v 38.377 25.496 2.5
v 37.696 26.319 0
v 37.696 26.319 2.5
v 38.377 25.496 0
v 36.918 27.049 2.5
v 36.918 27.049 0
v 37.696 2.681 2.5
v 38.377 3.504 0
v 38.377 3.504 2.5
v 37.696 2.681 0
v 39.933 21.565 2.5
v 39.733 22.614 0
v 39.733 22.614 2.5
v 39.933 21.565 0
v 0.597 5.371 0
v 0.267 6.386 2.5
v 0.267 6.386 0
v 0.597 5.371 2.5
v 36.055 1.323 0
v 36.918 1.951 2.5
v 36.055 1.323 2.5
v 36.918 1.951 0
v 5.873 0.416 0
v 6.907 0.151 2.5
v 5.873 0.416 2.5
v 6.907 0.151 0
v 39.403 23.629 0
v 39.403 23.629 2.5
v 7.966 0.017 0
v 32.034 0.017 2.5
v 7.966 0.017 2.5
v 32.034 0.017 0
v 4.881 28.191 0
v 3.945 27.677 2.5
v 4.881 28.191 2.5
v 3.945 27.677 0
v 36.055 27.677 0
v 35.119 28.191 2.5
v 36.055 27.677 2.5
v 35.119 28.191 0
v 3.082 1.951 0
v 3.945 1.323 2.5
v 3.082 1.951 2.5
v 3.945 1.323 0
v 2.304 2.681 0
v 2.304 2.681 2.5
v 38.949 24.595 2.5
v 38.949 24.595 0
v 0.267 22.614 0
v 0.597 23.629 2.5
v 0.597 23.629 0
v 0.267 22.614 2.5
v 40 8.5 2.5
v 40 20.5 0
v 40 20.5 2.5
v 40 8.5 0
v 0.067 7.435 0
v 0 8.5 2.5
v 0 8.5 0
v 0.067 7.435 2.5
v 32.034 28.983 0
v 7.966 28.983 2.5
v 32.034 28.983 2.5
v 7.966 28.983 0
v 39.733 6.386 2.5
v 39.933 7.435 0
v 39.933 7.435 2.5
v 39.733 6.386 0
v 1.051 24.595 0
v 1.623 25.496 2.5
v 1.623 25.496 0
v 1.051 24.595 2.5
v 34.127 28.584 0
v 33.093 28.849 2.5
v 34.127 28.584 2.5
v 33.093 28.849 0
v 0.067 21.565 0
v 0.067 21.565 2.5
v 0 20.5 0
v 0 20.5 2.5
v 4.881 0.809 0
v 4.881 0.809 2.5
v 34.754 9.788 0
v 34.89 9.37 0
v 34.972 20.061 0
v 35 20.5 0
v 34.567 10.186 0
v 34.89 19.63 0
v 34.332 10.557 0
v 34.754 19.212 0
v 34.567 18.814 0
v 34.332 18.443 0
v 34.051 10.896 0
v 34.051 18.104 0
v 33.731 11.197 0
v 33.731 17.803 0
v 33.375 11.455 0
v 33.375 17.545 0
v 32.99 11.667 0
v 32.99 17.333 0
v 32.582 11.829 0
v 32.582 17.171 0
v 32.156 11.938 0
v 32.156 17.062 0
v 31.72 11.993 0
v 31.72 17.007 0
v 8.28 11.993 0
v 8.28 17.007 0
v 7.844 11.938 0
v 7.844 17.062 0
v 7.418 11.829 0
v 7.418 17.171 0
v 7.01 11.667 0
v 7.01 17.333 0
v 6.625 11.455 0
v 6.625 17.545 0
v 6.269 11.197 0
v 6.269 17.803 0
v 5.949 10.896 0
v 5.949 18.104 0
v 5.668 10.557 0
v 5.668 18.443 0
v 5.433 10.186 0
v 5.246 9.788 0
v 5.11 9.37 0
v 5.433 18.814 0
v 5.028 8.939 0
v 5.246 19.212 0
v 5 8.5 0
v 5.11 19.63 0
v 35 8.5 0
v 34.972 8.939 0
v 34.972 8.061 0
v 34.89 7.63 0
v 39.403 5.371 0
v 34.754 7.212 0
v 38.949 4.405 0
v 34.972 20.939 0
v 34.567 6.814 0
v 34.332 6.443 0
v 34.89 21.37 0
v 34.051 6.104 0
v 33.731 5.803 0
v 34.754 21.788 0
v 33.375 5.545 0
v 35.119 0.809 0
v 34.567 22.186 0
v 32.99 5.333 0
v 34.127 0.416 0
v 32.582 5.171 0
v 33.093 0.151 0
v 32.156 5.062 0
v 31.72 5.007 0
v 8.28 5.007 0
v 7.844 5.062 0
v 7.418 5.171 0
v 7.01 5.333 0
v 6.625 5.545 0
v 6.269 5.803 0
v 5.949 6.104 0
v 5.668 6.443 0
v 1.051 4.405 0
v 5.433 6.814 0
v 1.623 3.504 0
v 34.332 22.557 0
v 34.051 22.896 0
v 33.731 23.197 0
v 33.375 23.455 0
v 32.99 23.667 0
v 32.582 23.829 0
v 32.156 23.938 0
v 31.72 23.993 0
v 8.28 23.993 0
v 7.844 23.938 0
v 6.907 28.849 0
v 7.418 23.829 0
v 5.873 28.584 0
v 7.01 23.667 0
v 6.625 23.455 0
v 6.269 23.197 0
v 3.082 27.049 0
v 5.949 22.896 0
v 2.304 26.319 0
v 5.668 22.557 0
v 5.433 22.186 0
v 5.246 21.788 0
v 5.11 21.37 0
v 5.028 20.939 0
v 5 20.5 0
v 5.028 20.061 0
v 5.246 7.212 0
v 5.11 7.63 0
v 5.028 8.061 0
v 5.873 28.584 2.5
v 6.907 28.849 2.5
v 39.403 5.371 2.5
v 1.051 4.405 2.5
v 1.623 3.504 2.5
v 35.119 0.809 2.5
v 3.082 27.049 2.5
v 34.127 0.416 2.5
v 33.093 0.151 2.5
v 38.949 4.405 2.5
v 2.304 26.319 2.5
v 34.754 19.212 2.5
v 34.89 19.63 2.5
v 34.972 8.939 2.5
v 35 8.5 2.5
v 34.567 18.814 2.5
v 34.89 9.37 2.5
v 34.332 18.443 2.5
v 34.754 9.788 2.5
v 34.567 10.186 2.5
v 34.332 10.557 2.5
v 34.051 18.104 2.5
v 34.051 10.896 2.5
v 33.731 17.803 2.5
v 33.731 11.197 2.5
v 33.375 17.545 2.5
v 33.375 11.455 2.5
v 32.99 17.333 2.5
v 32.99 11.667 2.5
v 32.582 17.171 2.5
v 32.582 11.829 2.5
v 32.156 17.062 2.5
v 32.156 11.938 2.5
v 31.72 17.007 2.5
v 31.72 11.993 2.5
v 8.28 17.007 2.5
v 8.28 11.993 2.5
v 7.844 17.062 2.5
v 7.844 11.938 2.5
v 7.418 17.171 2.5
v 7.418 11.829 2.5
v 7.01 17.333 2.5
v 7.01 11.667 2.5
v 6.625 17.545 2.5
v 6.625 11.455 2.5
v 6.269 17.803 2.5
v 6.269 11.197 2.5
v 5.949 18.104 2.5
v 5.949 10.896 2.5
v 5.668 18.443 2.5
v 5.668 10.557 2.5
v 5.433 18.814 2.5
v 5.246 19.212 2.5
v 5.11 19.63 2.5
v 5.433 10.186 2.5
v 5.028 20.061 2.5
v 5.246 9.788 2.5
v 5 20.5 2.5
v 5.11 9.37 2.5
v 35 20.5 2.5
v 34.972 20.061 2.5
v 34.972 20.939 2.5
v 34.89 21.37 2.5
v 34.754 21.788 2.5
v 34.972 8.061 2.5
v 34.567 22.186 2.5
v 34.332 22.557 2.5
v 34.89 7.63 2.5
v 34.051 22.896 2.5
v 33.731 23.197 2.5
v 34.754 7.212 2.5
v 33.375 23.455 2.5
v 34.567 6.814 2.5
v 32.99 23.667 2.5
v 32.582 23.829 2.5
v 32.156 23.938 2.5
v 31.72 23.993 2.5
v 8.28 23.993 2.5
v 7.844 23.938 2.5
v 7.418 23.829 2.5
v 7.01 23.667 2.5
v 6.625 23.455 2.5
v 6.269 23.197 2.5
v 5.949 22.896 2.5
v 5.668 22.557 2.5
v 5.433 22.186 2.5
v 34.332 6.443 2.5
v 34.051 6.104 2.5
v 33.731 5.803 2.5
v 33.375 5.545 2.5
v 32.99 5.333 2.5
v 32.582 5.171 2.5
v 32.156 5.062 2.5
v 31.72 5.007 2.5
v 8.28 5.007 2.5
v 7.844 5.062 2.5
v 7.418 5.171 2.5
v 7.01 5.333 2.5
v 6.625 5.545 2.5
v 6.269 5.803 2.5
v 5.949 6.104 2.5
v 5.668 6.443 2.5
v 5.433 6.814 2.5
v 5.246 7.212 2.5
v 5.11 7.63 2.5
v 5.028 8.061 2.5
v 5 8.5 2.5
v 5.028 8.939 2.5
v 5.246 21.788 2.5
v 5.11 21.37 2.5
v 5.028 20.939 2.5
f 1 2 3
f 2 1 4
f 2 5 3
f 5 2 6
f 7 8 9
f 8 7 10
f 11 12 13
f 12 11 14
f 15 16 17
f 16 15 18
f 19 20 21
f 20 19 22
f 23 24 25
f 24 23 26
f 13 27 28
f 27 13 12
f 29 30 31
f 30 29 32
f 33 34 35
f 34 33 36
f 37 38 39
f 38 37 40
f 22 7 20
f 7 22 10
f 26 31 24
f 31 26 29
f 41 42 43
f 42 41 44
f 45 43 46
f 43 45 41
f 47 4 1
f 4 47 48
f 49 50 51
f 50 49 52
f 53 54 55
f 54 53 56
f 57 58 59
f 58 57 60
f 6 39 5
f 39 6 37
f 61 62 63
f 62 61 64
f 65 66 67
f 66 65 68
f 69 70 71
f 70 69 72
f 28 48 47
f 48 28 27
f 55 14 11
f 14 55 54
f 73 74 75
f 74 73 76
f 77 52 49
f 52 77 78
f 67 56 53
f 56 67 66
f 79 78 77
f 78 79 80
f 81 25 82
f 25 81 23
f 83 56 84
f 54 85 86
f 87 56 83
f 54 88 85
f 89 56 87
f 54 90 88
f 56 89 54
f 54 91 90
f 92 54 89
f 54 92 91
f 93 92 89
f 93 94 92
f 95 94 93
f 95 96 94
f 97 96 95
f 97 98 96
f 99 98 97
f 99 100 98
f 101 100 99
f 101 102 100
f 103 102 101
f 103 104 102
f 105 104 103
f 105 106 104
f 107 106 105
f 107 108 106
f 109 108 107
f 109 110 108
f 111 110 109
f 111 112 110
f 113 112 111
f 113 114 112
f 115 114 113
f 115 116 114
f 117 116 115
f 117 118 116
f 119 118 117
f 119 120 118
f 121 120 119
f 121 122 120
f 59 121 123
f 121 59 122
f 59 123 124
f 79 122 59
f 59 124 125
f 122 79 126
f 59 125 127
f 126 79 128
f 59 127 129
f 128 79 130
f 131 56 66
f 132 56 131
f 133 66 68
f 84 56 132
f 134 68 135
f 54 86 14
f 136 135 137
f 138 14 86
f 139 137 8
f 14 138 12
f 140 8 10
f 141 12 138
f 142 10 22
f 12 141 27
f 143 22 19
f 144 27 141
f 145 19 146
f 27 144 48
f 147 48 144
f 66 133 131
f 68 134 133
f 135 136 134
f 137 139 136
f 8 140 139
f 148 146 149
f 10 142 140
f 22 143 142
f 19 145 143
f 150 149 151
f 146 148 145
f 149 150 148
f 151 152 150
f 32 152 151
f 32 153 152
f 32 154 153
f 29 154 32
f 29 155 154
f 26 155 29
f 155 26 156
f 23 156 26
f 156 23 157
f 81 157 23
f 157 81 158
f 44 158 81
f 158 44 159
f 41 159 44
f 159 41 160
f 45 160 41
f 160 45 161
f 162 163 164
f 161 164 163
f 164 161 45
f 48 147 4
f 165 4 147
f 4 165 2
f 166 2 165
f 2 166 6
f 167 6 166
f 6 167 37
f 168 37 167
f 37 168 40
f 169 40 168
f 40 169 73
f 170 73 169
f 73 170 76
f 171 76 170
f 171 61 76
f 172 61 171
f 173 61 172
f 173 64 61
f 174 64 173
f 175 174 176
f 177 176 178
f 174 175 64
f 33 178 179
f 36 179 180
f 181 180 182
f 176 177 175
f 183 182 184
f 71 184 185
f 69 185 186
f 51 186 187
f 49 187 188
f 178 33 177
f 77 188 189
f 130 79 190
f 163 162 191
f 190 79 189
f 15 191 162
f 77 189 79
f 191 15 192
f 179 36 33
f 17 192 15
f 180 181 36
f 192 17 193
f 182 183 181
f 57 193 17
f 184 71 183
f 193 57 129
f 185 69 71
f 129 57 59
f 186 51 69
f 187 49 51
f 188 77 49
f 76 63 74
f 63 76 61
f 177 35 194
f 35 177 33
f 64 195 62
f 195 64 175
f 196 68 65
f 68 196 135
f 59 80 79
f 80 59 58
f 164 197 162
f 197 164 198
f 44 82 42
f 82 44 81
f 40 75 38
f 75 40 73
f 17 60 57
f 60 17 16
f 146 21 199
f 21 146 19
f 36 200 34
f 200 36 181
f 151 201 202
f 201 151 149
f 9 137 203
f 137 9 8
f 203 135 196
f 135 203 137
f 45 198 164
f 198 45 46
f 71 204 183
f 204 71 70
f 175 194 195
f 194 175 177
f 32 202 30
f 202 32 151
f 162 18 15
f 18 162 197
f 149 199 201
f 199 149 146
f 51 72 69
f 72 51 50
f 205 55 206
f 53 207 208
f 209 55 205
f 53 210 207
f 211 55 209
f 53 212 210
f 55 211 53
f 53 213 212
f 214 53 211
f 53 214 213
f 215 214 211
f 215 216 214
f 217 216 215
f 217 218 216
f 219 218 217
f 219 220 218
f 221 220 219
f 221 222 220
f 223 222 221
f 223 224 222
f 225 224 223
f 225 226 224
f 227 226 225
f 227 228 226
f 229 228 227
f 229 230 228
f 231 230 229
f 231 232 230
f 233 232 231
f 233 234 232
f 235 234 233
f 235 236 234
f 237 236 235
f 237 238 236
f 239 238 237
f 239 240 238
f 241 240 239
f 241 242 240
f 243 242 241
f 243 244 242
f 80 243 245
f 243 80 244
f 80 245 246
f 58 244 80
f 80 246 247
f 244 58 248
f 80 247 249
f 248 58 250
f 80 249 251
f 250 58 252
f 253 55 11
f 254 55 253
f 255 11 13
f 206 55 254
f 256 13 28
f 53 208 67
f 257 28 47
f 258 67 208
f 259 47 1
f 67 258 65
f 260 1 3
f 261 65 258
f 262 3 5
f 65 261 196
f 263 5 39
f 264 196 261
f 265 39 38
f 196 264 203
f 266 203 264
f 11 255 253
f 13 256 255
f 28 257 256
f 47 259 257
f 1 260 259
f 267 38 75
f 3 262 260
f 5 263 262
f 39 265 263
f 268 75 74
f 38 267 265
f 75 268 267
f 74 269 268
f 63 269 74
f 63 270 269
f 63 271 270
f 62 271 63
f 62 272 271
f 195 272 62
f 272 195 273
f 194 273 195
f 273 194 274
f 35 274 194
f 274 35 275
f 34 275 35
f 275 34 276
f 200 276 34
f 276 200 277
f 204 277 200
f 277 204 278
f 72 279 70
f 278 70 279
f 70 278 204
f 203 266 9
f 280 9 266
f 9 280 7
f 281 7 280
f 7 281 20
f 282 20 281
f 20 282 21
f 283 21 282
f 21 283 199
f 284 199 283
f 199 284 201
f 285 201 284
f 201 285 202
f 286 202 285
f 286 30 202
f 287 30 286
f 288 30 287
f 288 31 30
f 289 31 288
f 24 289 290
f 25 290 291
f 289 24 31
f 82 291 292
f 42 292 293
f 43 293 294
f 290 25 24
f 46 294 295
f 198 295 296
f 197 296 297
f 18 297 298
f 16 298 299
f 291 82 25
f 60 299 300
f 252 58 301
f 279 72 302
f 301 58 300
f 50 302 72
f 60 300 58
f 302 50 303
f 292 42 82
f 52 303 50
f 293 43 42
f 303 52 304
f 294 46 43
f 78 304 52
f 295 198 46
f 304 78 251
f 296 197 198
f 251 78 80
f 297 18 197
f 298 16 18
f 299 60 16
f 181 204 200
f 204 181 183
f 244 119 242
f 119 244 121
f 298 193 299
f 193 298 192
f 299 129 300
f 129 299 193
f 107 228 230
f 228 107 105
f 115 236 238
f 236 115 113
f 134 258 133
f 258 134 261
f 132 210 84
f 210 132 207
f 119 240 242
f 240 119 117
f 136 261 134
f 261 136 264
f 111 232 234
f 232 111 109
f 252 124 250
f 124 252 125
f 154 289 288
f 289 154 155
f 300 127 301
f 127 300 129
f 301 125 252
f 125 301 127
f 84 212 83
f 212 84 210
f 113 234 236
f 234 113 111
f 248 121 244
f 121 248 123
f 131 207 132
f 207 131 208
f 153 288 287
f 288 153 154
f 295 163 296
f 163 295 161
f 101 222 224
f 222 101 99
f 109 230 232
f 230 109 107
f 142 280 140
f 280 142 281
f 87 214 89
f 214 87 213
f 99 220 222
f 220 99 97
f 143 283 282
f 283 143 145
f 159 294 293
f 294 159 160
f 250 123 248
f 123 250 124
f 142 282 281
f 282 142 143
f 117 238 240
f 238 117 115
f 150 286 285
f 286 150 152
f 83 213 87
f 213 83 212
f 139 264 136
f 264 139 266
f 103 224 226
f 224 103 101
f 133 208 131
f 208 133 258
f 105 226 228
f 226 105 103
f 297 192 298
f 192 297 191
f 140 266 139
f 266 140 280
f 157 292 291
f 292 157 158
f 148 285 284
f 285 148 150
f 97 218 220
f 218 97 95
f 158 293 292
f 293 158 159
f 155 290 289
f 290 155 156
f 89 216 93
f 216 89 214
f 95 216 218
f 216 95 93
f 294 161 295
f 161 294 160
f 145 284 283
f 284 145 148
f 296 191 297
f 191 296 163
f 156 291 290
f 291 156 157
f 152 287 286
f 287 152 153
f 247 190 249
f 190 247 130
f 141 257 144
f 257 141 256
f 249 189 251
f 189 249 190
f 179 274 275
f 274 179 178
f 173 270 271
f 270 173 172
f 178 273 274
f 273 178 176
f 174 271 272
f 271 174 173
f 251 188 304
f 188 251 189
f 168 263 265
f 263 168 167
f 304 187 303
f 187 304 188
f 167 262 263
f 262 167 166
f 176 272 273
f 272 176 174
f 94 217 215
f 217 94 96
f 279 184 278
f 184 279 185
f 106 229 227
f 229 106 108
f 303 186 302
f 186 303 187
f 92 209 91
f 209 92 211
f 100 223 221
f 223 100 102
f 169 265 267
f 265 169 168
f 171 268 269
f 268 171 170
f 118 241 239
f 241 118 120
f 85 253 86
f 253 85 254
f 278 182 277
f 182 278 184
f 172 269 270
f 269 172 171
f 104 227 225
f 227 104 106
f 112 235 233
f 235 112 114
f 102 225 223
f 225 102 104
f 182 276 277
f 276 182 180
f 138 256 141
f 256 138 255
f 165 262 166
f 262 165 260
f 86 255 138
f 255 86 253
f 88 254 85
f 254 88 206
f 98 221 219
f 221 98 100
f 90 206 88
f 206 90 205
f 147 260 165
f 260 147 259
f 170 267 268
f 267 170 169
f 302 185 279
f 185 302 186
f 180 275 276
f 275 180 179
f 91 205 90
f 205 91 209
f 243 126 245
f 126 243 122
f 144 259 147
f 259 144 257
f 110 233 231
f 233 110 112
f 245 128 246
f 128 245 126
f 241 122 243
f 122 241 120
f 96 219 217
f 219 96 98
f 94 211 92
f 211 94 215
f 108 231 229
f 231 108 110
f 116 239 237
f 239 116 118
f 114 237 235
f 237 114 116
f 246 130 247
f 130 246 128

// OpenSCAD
holeWidth = 30;
holeDepth = 7;
thickness = 2.5;
wallWidth = 5;
centerWidth = 5;

outerRadius = holeDepth / 2 + wallWidth;
outerWidth = holeWidth + wallWidth * 2;
outerLength = holeDepth * 2 + wallWidth * 2 + centerWidth;

$fn = 50;
difference() {
    translate([ outerRadius, outerRadius ]) linear_extrude(thickness) minkowski() {
        square([ outerWidth - outerRadius * 2, outerLength - outerRadius * 2 ]);
        circle(r = outerRadius);
    }
    translate([ wallWidth + holeDepth / 2, wallWidth + holeDepth / 2, -1 ]) linear_extrude(thickness + 2) hull() {
       circle(r = holeDepth / 2);
       translate([ holeWidth - holeDepth, 0 ]) circle(r = holeDepth / 2);
    }
    translate([ wallWidth + holeDepth / 2, wallWidth + holeDepth / 2 + holeDepth + centerWidth, -1 ]) linear_extrude(thickness + 2) hull() {
       circle(r = holeDepth / 2);
       translate([ holeWidth - holeDepth, 0 ]) circle(r = holeDepth / 2);
    }
}
